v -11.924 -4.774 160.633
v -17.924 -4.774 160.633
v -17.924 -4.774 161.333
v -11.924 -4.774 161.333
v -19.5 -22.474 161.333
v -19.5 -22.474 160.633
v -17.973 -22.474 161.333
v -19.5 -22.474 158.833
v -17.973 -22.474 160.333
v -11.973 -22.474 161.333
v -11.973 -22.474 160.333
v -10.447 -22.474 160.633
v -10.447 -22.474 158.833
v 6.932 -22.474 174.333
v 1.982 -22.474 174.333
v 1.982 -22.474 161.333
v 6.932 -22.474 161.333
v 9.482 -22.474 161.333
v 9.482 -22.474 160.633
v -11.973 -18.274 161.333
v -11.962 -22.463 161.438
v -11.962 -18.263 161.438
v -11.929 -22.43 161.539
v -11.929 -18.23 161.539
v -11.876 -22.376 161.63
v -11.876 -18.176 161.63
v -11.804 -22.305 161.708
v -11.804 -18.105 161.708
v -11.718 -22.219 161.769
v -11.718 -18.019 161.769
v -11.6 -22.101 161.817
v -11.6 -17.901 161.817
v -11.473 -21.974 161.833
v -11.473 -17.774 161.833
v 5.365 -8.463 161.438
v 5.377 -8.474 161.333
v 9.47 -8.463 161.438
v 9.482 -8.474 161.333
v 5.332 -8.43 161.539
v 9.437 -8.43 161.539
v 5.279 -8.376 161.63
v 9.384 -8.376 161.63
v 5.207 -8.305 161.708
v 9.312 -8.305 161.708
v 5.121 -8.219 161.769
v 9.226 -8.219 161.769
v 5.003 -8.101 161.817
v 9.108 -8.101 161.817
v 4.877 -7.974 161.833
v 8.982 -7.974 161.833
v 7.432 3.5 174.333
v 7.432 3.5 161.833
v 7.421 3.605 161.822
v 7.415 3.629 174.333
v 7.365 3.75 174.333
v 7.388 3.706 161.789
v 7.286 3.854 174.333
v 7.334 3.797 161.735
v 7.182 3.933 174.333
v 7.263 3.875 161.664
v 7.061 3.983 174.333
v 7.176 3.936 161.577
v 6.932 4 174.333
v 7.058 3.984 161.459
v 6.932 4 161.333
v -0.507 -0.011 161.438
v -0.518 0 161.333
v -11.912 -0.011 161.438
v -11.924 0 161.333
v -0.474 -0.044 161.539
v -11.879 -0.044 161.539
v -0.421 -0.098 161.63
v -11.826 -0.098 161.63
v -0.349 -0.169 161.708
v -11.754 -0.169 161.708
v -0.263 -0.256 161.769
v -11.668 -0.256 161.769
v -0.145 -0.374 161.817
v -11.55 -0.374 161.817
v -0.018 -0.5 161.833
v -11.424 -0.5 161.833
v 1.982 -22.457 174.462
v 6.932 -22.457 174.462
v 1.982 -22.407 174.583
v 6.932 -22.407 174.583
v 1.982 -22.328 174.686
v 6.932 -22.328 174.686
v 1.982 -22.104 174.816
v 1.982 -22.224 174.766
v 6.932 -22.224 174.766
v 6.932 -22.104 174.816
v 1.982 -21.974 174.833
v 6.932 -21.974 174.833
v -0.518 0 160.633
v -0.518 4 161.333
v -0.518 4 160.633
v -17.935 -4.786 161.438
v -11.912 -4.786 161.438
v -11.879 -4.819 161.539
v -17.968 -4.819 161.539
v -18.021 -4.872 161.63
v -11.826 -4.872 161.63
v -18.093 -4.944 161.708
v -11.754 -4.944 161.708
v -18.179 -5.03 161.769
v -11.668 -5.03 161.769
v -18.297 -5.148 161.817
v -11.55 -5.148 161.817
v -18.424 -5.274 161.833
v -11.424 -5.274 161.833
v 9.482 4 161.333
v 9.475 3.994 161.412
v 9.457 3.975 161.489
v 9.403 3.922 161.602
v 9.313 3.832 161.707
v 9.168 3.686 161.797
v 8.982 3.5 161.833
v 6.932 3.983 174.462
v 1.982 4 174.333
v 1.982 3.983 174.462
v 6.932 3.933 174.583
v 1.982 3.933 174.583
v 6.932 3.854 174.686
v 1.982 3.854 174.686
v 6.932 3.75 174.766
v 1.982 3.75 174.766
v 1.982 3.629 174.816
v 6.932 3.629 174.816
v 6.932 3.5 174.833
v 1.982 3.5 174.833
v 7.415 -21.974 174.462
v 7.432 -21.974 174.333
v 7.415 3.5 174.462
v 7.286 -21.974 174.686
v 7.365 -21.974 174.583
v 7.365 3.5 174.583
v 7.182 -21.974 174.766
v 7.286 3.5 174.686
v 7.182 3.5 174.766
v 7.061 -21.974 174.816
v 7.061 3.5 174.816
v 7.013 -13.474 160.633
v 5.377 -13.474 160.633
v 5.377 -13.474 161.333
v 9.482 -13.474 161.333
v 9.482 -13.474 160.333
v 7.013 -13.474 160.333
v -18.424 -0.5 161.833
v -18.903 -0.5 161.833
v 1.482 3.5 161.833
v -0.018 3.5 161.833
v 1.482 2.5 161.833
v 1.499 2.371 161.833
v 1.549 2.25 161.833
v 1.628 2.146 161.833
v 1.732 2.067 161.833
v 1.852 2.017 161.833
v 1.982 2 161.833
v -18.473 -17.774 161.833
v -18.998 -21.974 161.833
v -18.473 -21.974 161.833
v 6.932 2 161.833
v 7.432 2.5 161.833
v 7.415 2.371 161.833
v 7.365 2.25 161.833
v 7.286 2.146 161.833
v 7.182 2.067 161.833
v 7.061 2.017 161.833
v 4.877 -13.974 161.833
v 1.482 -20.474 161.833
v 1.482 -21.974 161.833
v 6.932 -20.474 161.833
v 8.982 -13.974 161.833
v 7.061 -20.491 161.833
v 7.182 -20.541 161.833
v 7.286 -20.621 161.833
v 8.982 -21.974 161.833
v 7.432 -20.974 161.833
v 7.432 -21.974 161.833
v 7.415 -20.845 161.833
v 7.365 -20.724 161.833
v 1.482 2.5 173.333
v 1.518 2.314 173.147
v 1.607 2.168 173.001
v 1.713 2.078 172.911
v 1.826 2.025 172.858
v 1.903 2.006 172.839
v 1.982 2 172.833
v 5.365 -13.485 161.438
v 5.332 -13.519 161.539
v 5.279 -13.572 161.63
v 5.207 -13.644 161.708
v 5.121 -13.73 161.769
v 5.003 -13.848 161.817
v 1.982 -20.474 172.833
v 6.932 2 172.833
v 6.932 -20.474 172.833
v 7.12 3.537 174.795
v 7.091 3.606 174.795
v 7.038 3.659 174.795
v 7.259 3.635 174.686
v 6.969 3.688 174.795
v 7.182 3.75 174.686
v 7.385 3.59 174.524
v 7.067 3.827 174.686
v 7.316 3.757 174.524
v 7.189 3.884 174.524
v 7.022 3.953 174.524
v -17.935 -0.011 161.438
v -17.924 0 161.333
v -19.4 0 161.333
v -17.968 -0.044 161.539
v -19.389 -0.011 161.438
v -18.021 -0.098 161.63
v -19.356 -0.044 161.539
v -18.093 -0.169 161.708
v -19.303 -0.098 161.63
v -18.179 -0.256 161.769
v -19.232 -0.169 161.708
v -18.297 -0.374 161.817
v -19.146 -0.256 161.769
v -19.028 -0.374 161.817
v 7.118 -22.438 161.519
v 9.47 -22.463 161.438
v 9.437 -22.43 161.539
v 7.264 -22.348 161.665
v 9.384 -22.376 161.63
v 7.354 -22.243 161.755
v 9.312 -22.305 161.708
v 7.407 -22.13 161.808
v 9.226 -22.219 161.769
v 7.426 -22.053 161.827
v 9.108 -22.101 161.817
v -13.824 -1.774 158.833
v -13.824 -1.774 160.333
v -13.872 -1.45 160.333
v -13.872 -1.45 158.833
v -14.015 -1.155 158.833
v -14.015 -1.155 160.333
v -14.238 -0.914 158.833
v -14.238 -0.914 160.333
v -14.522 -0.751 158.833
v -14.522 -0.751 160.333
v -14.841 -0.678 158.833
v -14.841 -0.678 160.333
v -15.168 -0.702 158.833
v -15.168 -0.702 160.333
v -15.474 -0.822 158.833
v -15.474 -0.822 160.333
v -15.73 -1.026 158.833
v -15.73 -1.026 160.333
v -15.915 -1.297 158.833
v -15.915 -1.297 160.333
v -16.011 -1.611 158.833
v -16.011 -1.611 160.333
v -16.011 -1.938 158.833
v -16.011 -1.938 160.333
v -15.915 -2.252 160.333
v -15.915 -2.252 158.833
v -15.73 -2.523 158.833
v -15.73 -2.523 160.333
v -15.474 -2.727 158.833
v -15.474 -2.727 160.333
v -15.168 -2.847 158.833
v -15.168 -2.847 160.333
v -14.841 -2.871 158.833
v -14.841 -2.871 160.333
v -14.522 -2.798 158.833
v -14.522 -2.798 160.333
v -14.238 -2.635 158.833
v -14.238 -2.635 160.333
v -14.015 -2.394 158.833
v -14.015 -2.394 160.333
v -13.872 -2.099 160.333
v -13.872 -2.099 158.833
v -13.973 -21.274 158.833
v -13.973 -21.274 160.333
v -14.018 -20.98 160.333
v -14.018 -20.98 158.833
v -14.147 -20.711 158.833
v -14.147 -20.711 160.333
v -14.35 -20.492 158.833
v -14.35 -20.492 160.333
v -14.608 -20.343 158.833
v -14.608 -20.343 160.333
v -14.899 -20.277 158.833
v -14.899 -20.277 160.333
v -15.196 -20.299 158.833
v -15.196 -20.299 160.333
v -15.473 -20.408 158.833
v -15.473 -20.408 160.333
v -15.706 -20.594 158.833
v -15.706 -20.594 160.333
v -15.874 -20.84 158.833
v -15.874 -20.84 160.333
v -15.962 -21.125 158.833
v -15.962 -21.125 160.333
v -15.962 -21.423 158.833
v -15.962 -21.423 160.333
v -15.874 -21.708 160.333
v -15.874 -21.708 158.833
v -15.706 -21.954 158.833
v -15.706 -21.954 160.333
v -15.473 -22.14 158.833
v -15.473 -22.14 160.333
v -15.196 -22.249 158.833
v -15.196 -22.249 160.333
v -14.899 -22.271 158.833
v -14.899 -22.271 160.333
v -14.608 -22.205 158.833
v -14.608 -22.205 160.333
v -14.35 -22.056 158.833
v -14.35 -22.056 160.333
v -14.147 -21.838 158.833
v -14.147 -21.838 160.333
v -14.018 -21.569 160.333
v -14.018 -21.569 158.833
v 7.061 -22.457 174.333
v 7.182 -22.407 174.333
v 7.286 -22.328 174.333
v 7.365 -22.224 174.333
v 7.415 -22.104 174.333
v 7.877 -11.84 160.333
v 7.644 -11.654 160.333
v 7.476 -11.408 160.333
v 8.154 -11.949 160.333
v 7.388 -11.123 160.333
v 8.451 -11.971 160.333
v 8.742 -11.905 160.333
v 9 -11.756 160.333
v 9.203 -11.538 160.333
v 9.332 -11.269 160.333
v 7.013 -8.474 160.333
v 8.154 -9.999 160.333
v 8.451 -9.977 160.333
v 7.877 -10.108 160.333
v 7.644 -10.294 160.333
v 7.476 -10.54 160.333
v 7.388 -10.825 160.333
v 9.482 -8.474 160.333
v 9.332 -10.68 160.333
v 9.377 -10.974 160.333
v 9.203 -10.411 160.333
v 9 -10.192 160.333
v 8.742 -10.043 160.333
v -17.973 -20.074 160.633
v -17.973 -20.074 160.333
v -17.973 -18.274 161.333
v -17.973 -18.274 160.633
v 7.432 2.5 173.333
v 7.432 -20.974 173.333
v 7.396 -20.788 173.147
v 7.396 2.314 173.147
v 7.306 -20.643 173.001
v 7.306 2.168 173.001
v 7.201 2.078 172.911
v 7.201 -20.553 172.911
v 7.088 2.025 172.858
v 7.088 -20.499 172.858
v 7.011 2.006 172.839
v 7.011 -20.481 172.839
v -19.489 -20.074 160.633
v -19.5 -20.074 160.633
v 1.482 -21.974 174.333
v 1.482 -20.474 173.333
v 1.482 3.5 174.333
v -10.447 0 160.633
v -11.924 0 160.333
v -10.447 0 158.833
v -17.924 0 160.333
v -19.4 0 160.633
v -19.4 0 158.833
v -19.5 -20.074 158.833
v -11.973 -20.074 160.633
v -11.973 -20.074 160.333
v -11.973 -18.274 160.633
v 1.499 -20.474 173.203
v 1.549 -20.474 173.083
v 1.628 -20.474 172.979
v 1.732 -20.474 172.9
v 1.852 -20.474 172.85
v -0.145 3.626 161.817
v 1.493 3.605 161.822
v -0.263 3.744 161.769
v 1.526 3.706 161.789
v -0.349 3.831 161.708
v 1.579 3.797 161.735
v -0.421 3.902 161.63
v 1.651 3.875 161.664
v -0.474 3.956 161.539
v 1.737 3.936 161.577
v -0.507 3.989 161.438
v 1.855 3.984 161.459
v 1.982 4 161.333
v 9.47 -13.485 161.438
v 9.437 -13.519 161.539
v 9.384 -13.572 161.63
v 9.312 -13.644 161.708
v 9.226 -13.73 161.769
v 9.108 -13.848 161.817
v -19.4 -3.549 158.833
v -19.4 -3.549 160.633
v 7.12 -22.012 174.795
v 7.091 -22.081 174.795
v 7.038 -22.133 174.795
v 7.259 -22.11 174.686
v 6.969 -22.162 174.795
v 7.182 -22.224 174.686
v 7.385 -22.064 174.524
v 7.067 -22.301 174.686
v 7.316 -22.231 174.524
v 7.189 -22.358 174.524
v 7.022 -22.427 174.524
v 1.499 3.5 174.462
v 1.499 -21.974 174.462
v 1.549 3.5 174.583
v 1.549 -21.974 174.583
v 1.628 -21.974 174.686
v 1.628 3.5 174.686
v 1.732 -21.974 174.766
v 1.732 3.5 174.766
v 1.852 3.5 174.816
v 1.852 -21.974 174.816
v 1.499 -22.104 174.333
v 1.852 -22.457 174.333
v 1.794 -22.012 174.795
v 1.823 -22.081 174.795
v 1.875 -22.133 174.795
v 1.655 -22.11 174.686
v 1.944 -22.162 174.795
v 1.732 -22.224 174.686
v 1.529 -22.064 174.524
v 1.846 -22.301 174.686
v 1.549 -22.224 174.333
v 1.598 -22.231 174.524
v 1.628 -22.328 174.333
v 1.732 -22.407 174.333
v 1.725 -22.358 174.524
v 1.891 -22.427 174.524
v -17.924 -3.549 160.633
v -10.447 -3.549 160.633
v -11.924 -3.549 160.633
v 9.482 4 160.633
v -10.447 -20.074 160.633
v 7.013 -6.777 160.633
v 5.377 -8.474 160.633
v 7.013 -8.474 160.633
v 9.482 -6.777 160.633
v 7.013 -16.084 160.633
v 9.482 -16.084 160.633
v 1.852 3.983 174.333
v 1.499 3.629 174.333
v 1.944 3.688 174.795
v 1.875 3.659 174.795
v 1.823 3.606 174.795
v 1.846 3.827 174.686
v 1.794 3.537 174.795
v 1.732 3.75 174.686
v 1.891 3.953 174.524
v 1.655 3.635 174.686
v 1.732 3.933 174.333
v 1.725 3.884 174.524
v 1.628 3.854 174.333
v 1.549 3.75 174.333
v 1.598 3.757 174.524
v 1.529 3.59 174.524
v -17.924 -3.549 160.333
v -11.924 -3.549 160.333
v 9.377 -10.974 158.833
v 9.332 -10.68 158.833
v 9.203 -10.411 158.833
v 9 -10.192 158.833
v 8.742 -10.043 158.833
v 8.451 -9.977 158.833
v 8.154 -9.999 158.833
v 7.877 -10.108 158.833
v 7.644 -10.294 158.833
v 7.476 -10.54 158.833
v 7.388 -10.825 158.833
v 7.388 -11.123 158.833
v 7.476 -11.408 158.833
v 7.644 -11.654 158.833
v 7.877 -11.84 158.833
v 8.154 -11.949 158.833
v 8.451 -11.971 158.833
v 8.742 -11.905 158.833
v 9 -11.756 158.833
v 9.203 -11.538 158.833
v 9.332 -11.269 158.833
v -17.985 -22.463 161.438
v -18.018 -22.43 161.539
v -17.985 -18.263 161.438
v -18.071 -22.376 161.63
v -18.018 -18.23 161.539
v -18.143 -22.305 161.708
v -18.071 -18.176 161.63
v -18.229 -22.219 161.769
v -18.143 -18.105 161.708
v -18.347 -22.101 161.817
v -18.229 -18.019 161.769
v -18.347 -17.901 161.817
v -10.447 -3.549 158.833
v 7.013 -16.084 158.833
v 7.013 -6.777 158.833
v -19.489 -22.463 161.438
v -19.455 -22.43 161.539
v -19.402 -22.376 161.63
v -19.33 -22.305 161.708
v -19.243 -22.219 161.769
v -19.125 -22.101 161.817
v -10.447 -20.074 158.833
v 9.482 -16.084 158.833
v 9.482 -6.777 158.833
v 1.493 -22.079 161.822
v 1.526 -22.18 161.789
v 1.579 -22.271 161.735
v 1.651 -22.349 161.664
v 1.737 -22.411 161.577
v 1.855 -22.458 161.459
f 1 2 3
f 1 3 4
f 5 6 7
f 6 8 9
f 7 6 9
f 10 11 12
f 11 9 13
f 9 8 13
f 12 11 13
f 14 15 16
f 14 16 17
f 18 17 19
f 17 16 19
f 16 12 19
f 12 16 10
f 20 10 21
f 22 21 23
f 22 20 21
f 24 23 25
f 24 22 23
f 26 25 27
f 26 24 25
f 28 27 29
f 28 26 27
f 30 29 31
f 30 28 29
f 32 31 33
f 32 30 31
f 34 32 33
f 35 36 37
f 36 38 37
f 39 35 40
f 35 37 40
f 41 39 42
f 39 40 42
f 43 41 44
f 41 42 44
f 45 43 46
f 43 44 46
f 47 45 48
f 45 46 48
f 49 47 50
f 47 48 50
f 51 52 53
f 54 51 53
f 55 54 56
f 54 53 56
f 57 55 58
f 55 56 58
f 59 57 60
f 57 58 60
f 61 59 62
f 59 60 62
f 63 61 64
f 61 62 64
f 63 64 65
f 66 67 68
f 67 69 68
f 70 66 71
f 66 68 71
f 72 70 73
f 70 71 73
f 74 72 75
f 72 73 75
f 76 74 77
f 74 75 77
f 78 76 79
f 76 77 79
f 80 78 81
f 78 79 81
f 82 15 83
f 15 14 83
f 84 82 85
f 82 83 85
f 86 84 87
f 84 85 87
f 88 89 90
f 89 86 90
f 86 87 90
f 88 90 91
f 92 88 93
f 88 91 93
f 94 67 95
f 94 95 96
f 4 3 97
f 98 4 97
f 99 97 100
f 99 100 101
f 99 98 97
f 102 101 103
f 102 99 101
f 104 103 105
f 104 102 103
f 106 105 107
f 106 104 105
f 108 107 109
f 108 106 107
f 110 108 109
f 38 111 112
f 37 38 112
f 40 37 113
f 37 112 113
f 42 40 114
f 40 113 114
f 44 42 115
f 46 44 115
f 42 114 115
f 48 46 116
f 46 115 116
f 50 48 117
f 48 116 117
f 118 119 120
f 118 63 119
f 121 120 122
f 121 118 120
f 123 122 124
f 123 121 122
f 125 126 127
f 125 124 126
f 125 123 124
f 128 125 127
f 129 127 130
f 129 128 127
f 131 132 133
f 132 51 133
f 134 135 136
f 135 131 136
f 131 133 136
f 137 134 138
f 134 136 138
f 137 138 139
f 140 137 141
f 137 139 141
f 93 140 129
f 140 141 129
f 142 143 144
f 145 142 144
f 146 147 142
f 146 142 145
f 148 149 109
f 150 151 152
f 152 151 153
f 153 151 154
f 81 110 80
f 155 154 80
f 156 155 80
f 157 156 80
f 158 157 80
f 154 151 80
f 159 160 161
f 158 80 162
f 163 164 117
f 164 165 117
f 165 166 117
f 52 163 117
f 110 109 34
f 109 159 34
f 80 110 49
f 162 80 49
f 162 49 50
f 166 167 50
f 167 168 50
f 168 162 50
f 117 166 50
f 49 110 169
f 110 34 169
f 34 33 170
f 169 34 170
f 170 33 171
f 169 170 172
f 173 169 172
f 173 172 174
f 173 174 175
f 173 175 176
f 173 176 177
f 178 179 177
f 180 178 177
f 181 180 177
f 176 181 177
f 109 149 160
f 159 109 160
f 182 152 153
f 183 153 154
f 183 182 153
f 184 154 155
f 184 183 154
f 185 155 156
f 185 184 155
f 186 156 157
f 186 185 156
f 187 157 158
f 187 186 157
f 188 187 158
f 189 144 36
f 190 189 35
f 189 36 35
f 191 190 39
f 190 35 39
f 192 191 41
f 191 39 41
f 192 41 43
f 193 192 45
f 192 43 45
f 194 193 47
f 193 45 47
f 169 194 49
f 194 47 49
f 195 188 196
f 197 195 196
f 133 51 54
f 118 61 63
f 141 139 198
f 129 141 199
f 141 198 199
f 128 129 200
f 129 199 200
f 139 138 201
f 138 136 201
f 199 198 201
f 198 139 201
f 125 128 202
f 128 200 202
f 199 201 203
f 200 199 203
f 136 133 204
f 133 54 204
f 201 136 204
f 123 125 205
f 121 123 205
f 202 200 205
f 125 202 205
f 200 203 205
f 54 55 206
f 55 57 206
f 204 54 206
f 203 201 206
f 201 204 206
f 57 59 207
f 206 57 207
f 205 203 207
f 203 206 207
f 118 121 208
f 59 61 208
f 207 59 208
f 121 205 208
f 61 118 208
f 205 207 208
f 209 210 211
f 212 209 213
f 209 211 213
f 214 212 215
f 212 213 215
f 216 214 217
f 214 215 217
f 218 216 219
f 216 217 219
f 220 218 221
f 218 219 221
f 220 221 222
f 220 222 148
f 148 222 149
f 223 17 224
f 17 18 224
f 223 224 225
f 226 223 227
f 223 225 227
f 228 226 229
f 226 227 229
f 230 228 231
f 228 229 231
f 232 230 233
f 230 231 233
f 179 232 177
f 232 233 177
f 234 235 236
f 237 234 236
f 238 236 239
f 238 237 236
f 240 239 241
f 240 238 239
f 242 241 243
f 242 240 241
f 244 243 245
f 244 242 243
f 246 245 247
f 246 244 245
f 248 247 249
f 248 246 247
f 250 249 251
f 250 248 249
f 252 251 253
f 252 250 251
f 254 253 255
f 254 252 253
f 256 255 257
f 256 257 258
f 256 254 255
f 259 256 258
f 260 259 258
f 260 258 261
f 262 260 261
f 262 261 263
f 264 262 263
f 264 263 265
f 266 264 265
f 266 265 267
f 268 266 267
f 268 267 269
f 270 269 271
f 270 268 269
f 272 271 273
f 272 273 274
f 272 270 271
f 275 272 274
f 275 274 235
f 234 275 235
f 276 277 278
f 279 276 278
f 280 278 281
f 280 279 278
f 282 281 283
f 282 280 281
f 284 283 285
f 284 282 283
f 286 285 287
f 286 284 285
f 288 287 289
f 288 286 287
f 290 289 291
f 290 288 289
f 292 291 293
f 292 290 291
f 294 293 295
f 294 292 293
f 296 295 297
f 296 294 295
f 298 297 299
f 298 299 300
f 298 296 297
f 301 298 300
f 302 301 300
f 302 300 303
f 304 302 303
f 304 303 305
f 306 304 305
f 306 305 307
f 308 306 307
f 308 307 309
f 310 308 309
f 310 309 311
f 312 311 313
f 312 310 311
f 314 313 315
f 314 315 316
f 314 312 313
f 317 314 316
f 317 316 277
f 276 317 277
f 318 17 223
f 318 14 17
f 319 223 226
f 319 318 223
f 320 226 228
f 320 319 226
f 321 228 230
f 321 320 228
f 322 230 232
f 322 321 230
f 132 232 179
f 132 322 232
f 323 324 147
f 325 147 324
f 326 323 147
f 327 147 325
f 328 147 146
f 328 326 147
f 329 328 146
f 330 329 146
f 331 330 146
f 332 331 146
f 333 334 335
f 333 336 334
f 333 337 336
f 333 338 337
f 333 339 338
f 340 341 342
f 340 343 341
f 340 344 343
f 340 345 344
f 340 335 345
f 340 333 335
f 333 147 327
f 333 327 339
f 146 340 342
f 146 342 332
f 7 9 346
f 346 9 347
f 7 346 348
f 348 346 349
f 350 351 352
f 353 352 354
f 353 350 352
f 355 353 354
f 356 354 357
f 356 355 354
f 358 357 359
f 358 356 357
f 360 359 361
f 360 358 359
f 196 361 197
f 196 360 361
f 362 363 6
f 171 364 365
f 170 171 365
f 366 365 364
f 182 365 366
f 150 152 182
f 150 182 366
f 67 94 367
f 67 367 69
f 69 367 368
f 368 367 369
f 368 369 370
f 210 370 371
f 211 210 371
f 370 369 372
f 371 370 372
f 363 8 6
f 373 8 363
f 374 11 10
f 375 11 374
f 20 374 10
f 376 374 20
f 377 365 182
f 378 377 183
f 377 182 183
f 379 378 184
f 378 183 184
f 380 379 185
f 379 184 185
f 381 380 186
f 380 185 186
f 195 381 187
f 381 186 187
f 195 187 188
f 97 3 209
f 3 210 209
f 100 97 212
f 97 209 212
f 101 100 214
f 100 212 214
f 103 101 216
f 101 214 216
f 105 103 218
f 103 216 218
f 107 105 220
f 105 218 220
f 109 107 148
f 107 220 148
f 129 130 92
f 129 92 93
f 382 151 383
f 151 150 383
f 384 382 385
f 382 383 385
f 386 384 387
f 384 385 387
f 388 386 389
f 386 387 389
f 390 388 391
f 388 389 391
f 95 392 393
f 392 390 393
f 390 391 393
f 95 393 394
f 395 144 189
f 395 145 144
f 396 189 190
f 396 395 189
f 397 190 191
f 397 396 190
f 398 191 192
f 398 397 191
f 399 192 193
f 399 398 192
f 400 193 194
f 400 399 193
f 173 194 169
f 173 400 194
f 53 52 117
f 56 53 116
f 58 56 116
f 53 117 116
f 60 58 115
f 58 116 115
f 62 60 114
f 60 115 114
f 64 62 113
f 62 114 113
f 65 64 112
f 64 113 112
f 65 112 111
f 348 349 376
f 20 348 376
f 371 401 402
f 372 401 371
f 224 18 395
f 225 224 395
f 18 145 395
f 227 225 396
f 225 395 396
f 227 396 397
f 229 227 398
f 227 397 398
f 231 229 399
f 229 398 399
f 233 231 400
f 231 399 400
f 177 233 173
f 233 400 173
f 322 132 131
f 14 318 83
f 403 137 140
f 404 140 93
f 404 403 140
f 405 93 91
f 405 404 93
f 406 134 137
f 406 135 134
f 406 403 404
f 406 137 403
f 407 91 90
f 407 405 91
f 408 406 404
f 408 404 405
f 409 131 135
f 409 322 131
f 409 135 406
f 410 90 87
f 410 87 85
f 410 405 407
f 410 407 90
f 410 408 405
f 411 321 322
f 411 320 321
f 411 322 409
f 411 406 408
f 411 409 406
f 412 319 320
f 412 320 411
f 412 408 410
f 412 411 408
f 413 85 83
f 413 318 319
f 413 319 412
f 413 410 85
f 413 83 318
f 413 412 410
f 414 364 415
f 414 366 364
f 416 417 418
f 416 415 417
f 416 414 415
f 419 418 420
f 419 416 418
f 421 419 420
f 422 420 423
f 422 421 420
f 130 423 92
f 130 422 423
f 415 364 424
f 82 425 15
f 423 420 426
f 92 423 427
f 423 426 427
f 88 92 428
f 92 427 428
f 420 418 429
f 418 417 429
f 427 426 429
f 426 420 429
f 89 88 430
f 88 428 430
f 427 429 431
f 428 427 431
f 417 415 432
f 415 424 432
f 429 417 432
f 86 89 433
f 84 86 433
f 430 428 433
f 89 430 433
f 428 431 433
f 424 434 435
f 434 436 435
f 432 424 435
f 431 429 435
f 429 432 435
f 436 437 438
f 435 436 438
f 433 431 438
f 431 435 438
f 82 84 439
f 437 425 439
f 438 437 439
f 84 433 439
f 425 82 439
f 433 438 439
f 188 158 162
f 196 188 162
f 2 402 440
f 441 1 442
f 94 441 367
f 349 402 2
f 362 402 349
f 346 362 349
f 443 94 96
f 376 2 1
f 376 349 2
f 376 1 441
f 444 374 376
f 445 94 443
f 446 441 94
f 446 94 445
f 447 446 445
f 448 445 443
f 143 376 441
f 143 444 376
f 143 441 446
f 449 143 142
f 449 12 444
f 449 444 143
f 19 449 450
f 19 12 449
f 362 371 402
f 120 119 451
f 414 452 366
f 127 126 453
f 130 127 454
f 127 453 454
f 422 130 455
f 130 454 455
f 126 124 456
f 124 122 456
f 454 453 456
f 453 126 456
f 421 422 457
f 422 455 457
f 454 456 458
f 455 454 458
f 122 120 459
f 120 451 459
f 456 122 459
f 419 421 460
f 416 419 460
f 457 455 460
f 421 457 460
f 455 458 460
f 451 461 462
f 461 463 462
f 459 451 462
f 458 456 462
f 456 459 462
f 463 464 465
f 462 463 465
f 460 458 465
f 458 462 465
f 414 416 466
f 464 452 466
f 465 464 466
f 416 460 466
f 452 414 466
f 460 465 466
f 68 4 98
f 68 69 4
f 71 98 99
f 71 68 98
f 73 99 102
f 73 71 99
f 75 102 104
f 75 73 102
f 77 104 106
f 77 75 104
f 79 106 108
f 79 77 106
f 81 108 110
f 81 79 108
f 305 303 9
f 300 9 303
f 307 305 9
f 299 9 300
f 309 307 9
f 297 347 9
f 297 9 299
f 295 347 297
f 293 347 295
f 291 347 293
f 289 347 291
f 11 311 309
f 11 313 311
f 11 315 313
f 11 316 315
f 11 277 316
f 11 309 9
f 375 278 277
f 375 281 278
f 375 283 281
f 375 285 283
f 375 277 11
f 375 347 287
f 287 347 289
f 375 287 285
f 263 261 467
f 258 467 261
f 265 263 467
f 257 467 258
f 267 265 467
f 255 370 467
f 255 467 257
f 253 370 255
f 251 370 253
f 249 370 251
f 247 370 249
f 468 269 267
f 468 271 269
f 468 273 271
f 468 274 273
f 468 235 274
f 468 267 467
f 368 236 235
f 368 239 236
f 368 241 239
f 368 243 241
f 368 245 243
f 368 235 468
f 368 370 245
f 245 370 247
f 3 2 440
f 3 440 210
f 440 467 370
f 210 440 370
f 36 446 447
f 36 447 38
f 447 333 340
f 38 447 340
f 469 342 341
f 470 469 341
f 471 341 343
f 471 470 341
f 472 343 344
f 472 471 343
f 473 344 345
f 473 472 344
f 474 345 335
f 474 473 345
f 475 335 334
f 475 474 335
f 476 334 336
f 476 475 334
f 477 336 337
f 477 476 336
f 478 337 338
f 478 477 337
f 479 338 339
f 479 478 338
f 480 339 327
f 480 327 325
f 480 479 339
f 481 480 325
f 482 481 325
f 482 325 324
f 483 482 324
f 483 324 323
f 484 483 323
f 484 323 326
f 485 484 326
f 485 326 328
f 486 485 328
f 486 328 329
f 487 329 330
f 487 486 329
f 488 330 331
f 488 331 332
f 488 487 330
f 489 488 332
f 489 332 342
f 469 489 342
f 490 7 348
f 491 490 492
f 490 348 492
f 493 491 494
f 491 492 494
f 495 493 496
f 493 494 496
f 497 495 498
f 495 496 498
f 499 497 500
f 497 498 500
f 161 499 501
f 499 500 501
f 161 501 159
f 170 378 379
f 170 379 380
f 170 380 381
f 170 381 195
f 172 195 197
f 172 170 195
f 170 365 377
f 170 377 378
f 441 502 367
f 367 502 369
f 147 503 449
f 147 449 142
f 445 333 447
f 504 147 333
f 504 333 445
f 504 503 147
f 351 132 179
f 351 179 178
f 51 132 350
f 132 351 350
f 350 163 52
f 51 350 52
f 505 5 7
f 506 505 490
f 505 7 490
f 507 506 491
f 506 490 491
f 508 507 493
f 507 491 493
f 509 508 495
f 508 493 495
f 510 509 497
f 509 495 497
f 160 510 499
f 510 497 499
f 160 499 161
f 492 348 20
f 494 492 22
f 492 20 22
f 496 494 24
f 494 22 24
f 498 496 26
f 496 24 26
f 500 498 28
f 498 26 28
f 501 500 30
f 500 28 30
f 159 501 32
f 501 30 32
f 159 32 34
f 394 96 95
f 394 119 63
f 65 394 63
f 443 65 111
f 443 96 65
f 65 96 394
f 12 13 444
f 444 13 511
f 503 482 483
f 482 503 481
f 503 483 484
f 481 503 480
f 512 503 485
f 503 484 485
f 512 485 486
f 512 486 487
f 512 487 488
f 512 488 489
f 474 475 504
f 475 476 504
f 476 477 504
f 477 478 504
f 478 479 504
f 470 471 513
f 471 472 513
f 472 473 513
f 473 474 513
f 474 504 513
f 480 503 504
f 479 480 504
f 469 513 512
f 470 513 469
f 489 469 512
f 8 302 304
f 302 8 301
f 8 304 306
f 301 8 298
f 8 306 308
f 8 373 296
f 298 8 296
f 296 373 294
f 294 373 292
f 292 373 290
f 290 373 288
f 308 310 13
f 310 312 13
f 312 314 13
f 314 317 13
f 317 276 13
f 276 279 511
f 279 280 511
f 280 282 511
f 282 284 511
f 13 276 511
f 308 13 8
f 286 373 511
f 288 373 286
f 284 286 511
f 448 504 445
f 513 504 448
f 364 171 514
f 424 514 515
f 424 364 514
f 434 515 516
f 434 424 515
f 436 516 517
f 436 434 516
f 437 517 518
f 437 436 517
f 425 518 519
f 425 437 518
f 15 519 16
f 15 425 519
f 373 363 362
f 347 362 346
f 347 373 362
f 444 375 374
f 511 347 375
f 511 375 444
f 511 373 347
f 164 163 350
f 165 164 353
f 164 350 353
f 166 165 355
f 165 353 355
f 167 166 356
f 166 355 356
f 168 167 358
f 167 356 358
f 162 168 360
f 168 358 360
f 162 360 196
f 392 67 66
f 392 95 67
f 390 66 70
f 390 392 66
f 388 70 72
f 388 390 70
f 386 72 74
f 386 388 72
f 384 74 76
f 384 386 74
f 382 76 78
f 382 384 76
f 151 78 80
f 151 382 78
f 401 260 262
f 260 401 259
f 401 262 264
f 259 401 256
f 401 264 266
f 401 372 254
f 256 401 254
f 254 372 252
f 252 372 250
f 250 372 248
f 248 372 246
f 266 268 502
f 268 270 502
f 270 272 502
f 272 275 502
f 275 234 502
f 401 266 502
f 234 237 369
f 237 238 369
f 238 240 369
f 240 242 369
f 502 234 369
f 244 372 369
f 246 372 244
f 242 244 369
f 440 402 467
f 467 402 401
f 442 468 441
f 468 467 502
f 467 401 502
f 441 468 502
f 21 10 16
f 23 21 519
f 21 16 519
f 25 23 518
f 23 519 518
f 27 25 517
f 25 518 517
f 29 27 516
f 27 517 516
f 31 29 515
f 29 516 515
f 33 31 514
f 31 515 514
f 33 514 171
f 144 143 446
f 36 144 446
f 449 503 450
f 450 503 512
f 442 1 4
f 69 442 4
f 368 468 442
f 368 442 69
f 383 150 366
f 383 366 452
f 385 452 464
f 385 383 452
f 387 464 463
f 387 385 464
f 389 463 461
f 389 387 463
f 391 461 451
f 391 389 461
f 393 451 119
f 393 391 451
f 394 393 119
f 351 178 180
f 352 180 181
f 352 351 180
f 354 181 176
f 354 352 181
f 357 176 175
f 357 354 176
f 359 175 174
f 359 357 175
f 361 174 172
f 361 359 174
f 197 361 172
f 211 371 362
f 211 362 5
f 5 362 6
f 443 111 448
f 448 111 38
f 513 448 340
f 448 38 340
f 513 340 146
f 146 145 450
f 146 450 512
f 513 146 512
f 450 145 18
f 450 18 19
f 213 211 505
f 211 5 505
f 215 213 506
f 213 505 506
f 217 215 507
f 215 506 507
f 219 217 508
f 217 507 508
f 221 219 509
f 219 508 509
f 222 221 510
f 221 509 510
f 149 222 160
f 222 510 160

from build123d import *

# Parameters (mm, degrees)
SZKIC1_W                      = 9.053278123
SZKIC1_H                      = 2.4000014
SZKIC1_R                      = 1.00000054
DODANIE_WYCI_GNI_CIE1_DEPTH   = 1.8
SZKIC1_W_2                    = 2.468942166
SZKIC1_H_2                    = 9.307035938
DODANIE_WYCI_GNI_CIE1_2_DEPTH = 1.8
SZKIC1_W_3                    = 8.953699963
SZKIC1_H_3                    = 3.54899108
SZKIC1_R_2                    = 1.10000034
DODANIE_WYCI_GNI_CIE1_3_DEPTH = 1.8
SZKIC2_R                      = 1.00000054
SZKIC2_R_2                    = 1.10000034
DODANIE_WYCI_GNI_CIE2_DEPTH   = 1.2
WYTNIJ_WYCI_GNI_CIE1_START    = -1.5
SZKIC3_W                      = 4.104918972
SZKIC3_H                      = 5
SZKIC3_R                      = 1.00000054
SZKIC3_W_2                    = 6
SZKIC3_H_2                    = 4.77449554
SZKIC3_R_2                    = 1.10000034
SZKIC3_H_3                    = 4.2000007
WYTNIJ_WYCI_GNI_CIE1_DEPTH    = 1.5
SZKIC7_W                      = 10
SZKIC7_H                      = 1.2
DODANIE_WYCI_GNI_CIE3_DEPTH   = 4
SZKIC8_W                      = 5.950377167
SZKIC8_H                      = 2
DODANIE_WYCI_GNI_CIE4_DEPTH   = 11
SZKIC9_W                      = 5.950377167
SZKIC9_H                      = 26.47425658
DODANIE_WYCI_GNI_CIE5_DEPTH   = 2
ZAOKR_GLENIE4_R               = 0.5


with BuildPart() as part:
    # Szkic1 → Dodanie-wyciągnięcie1 (new body)
    with BuildSketch(Plane.XY.offset(158.832884642)):
        with Locations((-14.973320297, -21.27425588)):
            Rectangle(SZKIC1_W, SZKIC1_H)
        with Locations((-14.973320296, -21.27425588)):
            Circle(SZKIC1_R, mode=Mode.SUBTRACT)
    extrude(amount=DODANIE_WYCI_GNI_CIE1_DEPTH)



with BuildPart() as body_2:
    # Szkic1 → Dodanie-wyci_gni_cie1 2 (new body)
    with BuildSketch(Plane.XY.offset(158.832884642)):
        with Locations((8.247126613, -11.430282713)):
            Rectangle(SZKIC1_W_2, SZKIC1_H_2)
        with Locations((8.376678724, -10.97425616)):
            Circle(SZKIC1_R, mode=Mode.SUBTRACT)
    extrude(amount=DODANIE_WYCI_GNI_CIE1_2_DEPTH)


with BuildPart() as body_3:
    # Szkic1 → Dodanie-wyci_gni_cie1 3 (new body)
    with BuildSketch(Plane.XY.offset(158.832884642)):
        with Locations((-14.923531217, -1.77449554)):
            Rectangle(SZKIC1_W_3, SZKIC1_H_3)
        with Locations((-14.923531216, -1.77449554)):
            Circle(SZKIC1_R_2, mode=Mode.SUBTRACT)
    extrude(amount=DODANIE_WYCI_GNI_CIE1_3_DEPTH)


with BuildPart() as part_1:
    add(part.part)

    add(body_2.part)  # Dodanie-wyciągnięcie2 merges body 2

    add(body_3.part)  # Dodanie-wyciągnięcie2 merges body 3
    # Szkic2 → Dodanie-wyciągnięcie2 (add)
    with BuildSketch(Plane.XY.offset(160.632884642)):
        Polygon((9.481597696, 0), (-19.400381198, 0), (-19.499959358, -22.47425658), (9.481597696, -22.47425658), align=None)
        with Locations((8.376678724, -10.97425616)):
            Circle(SZKIC2_R, mode=Mode.SUBTRACT)
        with Locations((-14.973320296, -21.27425588)):
            Circle(SZKIC2_R, mode=Mode.SUBTRACT)
        with Locations((-14.923531216, -1.77449554)):
            Circle(SZKIC2_R_2, mode=Mode.SUBTRACT)
    extrude(amount=DODANIE_WYCI_GNI_CIE2_DEPTH)

    # Szkic3 → Wytnij-wyciągnięcie1 (cut)
    # profile 1 of 3: a face of its own
    with BuildSketch(Plane.XY.offset(161.832884642).offset(WYTNIJ_WYCI_GNI_CIE1_START)):
        with Locations((7.42913821, -10.97425616)):
            Rectangle(SZKIC3_W, SZKIC3_H)
        with Locations((8.376678724, -10.97425616)):
            Circle(SZKIC3_R, mode=Mode.SUBTRACT)
    # profile 2 of 3: a face of its own
    with BuildSketch(Plane.XY.offset(161.832884642).offset(WYTNIJ_WYCI_GNI_CIE1_START)):
        with Locations((-14.923531216, -2.38724777)):
            Rectangle(SZKIC3_W_2, SZKIC3_H_2)
        with Locations((-14.923531216, -1.77449554)):
            Circle(SZKIC3_R_2, mode=Mode.SUBTRACT)
    # profile 3 of 3: a face of its own
    with BuildSketch(Plane.XY.offset(161.832884642).offset(WYTNIJ_WYCI_GNI_CIE1_START)):
        with Locations((-14.973320296, -20.37425623)):
            Rectangle(SZKIC3_W_2, SZKIC3_H_3)
        with Locations((-14.973320296, -21.27425588)):
            Circle(SZKIC3_R, mode=Mode.SUBTRACT)
    extrude(amount=WYTNIJ_WYCI_GNI_CIE1_DEPTH, mode=Mode.SUBTRACT)

    # Szkic7 → Dodanie-wyciągnięcie3 (add)
    with BuildSketch(Plane(origin=(0, 0, 0), x_dir=(1, 0, 0), z_dir=(0, 1, 0))):
        with Locations((4.481597696, -161.232884642)):
            Rectangle(SZKIC7_W, SZKIC7_H)
    extrude(amount=DODANIE_WYCI_GNI_CIE3_DEPTH)

    # Szkic8 → Dodanie-wyciągnięcie4 (add)
    with BuildSketch(Plane.XY.offset(161.832884642)):
        with Locations((4.45678628, 3)):
            Rectangle(SZKIC8_W, SZKIC8_H)
        with Locations((4.45678628, -21.47425658)):
            Rectangle(SZKIC8_W, SZKIC8_H)
    extrude(amount=DODANIE_WYCI_GNI_CIE4_DEPTH)

    # Szkic9 → Dodanie-wyciągnięcie5 (add)
    with BuildSketch(Plane.XY.offset(172.832884642)):
        with Locations((4.45678628, -9.23712829)):
            Rectangle(SZKIC9_W, SZKIC9_H)
    extrude(amount=DODANIE_WYCI_GNI_CIE5_DEPTH)

    # Zaokrąglenie4
    zaokr_glenie4_edges = [part_1.edges().sort_by_distance(p)[0] for p in [
        (-11.973320296, -20.37425623, 161.832884642),
        (-14.973320296, -18.27425588, 161.832884642),
        (-17.973320296, -20.37425623, 161.832884642),
        (-6.22096676, 0, 161.832884642),
        (-0.518402304, 2, 161.832884642),
        (0.481597696, 4, 161.832884642),
        (8.456786279, 4, 161.832884642),
        (7.431974863, 2, 167.332884642),
        (7.431974863, 4, 168.332884642),
        (1.481597696, 4, 168.332884642),
        (1.481597696, 2, 167.332884642),
        (8.456786279, -22.47425658, 161.832884642),
        (7.431974863, -22.47425658, 168.332884642),
        (7.431974863, -20.47425658, 167.332884642),
        (1.481597696, -22.47425658, 168.332884642),
        (7.431974863, -9.23712829, 172.832884642),
        (1.481597696, -9.23712829, 172.832884642),
        (7.431974863, -9.23712829, 174.832884642),
        (4.456786279, 4, 174.832884642),
        (1.481597696, -9.23712829, 174.832884642),
        (4.456786279, -22.47425658, 174.832884642),
        (9.481597696, -17.97425637, 161.832884642),
        (-19.450170278, -11.23712829, 161.832884642),
        (-18.736639827, -22.47425658, 161.832884642),
        (-18.661956207, 0, 161.832884642),
        (9.481597696, -2.23712808, 161.832884642),
        (-5.2458613, -22.47425658, 161.832884642),
        (7.42913821, -8.47425616, 161.832884642),
        (5.376678724, -10.97425616, 161.832884642),
        (7.42913821, -13.47425616, 161.832884642),
        (-17.923531216, -2.38724777, 161.832884642),
        (-14.923531216, -4.77449554, 161.832884642),
        (-11.923531216, -2.38724777, 161.832884642),
    ]]
    fillet(zaokr_glenie4_edges, radius=ZAOKR_GLENIE4_R)


solid = part_1.part
